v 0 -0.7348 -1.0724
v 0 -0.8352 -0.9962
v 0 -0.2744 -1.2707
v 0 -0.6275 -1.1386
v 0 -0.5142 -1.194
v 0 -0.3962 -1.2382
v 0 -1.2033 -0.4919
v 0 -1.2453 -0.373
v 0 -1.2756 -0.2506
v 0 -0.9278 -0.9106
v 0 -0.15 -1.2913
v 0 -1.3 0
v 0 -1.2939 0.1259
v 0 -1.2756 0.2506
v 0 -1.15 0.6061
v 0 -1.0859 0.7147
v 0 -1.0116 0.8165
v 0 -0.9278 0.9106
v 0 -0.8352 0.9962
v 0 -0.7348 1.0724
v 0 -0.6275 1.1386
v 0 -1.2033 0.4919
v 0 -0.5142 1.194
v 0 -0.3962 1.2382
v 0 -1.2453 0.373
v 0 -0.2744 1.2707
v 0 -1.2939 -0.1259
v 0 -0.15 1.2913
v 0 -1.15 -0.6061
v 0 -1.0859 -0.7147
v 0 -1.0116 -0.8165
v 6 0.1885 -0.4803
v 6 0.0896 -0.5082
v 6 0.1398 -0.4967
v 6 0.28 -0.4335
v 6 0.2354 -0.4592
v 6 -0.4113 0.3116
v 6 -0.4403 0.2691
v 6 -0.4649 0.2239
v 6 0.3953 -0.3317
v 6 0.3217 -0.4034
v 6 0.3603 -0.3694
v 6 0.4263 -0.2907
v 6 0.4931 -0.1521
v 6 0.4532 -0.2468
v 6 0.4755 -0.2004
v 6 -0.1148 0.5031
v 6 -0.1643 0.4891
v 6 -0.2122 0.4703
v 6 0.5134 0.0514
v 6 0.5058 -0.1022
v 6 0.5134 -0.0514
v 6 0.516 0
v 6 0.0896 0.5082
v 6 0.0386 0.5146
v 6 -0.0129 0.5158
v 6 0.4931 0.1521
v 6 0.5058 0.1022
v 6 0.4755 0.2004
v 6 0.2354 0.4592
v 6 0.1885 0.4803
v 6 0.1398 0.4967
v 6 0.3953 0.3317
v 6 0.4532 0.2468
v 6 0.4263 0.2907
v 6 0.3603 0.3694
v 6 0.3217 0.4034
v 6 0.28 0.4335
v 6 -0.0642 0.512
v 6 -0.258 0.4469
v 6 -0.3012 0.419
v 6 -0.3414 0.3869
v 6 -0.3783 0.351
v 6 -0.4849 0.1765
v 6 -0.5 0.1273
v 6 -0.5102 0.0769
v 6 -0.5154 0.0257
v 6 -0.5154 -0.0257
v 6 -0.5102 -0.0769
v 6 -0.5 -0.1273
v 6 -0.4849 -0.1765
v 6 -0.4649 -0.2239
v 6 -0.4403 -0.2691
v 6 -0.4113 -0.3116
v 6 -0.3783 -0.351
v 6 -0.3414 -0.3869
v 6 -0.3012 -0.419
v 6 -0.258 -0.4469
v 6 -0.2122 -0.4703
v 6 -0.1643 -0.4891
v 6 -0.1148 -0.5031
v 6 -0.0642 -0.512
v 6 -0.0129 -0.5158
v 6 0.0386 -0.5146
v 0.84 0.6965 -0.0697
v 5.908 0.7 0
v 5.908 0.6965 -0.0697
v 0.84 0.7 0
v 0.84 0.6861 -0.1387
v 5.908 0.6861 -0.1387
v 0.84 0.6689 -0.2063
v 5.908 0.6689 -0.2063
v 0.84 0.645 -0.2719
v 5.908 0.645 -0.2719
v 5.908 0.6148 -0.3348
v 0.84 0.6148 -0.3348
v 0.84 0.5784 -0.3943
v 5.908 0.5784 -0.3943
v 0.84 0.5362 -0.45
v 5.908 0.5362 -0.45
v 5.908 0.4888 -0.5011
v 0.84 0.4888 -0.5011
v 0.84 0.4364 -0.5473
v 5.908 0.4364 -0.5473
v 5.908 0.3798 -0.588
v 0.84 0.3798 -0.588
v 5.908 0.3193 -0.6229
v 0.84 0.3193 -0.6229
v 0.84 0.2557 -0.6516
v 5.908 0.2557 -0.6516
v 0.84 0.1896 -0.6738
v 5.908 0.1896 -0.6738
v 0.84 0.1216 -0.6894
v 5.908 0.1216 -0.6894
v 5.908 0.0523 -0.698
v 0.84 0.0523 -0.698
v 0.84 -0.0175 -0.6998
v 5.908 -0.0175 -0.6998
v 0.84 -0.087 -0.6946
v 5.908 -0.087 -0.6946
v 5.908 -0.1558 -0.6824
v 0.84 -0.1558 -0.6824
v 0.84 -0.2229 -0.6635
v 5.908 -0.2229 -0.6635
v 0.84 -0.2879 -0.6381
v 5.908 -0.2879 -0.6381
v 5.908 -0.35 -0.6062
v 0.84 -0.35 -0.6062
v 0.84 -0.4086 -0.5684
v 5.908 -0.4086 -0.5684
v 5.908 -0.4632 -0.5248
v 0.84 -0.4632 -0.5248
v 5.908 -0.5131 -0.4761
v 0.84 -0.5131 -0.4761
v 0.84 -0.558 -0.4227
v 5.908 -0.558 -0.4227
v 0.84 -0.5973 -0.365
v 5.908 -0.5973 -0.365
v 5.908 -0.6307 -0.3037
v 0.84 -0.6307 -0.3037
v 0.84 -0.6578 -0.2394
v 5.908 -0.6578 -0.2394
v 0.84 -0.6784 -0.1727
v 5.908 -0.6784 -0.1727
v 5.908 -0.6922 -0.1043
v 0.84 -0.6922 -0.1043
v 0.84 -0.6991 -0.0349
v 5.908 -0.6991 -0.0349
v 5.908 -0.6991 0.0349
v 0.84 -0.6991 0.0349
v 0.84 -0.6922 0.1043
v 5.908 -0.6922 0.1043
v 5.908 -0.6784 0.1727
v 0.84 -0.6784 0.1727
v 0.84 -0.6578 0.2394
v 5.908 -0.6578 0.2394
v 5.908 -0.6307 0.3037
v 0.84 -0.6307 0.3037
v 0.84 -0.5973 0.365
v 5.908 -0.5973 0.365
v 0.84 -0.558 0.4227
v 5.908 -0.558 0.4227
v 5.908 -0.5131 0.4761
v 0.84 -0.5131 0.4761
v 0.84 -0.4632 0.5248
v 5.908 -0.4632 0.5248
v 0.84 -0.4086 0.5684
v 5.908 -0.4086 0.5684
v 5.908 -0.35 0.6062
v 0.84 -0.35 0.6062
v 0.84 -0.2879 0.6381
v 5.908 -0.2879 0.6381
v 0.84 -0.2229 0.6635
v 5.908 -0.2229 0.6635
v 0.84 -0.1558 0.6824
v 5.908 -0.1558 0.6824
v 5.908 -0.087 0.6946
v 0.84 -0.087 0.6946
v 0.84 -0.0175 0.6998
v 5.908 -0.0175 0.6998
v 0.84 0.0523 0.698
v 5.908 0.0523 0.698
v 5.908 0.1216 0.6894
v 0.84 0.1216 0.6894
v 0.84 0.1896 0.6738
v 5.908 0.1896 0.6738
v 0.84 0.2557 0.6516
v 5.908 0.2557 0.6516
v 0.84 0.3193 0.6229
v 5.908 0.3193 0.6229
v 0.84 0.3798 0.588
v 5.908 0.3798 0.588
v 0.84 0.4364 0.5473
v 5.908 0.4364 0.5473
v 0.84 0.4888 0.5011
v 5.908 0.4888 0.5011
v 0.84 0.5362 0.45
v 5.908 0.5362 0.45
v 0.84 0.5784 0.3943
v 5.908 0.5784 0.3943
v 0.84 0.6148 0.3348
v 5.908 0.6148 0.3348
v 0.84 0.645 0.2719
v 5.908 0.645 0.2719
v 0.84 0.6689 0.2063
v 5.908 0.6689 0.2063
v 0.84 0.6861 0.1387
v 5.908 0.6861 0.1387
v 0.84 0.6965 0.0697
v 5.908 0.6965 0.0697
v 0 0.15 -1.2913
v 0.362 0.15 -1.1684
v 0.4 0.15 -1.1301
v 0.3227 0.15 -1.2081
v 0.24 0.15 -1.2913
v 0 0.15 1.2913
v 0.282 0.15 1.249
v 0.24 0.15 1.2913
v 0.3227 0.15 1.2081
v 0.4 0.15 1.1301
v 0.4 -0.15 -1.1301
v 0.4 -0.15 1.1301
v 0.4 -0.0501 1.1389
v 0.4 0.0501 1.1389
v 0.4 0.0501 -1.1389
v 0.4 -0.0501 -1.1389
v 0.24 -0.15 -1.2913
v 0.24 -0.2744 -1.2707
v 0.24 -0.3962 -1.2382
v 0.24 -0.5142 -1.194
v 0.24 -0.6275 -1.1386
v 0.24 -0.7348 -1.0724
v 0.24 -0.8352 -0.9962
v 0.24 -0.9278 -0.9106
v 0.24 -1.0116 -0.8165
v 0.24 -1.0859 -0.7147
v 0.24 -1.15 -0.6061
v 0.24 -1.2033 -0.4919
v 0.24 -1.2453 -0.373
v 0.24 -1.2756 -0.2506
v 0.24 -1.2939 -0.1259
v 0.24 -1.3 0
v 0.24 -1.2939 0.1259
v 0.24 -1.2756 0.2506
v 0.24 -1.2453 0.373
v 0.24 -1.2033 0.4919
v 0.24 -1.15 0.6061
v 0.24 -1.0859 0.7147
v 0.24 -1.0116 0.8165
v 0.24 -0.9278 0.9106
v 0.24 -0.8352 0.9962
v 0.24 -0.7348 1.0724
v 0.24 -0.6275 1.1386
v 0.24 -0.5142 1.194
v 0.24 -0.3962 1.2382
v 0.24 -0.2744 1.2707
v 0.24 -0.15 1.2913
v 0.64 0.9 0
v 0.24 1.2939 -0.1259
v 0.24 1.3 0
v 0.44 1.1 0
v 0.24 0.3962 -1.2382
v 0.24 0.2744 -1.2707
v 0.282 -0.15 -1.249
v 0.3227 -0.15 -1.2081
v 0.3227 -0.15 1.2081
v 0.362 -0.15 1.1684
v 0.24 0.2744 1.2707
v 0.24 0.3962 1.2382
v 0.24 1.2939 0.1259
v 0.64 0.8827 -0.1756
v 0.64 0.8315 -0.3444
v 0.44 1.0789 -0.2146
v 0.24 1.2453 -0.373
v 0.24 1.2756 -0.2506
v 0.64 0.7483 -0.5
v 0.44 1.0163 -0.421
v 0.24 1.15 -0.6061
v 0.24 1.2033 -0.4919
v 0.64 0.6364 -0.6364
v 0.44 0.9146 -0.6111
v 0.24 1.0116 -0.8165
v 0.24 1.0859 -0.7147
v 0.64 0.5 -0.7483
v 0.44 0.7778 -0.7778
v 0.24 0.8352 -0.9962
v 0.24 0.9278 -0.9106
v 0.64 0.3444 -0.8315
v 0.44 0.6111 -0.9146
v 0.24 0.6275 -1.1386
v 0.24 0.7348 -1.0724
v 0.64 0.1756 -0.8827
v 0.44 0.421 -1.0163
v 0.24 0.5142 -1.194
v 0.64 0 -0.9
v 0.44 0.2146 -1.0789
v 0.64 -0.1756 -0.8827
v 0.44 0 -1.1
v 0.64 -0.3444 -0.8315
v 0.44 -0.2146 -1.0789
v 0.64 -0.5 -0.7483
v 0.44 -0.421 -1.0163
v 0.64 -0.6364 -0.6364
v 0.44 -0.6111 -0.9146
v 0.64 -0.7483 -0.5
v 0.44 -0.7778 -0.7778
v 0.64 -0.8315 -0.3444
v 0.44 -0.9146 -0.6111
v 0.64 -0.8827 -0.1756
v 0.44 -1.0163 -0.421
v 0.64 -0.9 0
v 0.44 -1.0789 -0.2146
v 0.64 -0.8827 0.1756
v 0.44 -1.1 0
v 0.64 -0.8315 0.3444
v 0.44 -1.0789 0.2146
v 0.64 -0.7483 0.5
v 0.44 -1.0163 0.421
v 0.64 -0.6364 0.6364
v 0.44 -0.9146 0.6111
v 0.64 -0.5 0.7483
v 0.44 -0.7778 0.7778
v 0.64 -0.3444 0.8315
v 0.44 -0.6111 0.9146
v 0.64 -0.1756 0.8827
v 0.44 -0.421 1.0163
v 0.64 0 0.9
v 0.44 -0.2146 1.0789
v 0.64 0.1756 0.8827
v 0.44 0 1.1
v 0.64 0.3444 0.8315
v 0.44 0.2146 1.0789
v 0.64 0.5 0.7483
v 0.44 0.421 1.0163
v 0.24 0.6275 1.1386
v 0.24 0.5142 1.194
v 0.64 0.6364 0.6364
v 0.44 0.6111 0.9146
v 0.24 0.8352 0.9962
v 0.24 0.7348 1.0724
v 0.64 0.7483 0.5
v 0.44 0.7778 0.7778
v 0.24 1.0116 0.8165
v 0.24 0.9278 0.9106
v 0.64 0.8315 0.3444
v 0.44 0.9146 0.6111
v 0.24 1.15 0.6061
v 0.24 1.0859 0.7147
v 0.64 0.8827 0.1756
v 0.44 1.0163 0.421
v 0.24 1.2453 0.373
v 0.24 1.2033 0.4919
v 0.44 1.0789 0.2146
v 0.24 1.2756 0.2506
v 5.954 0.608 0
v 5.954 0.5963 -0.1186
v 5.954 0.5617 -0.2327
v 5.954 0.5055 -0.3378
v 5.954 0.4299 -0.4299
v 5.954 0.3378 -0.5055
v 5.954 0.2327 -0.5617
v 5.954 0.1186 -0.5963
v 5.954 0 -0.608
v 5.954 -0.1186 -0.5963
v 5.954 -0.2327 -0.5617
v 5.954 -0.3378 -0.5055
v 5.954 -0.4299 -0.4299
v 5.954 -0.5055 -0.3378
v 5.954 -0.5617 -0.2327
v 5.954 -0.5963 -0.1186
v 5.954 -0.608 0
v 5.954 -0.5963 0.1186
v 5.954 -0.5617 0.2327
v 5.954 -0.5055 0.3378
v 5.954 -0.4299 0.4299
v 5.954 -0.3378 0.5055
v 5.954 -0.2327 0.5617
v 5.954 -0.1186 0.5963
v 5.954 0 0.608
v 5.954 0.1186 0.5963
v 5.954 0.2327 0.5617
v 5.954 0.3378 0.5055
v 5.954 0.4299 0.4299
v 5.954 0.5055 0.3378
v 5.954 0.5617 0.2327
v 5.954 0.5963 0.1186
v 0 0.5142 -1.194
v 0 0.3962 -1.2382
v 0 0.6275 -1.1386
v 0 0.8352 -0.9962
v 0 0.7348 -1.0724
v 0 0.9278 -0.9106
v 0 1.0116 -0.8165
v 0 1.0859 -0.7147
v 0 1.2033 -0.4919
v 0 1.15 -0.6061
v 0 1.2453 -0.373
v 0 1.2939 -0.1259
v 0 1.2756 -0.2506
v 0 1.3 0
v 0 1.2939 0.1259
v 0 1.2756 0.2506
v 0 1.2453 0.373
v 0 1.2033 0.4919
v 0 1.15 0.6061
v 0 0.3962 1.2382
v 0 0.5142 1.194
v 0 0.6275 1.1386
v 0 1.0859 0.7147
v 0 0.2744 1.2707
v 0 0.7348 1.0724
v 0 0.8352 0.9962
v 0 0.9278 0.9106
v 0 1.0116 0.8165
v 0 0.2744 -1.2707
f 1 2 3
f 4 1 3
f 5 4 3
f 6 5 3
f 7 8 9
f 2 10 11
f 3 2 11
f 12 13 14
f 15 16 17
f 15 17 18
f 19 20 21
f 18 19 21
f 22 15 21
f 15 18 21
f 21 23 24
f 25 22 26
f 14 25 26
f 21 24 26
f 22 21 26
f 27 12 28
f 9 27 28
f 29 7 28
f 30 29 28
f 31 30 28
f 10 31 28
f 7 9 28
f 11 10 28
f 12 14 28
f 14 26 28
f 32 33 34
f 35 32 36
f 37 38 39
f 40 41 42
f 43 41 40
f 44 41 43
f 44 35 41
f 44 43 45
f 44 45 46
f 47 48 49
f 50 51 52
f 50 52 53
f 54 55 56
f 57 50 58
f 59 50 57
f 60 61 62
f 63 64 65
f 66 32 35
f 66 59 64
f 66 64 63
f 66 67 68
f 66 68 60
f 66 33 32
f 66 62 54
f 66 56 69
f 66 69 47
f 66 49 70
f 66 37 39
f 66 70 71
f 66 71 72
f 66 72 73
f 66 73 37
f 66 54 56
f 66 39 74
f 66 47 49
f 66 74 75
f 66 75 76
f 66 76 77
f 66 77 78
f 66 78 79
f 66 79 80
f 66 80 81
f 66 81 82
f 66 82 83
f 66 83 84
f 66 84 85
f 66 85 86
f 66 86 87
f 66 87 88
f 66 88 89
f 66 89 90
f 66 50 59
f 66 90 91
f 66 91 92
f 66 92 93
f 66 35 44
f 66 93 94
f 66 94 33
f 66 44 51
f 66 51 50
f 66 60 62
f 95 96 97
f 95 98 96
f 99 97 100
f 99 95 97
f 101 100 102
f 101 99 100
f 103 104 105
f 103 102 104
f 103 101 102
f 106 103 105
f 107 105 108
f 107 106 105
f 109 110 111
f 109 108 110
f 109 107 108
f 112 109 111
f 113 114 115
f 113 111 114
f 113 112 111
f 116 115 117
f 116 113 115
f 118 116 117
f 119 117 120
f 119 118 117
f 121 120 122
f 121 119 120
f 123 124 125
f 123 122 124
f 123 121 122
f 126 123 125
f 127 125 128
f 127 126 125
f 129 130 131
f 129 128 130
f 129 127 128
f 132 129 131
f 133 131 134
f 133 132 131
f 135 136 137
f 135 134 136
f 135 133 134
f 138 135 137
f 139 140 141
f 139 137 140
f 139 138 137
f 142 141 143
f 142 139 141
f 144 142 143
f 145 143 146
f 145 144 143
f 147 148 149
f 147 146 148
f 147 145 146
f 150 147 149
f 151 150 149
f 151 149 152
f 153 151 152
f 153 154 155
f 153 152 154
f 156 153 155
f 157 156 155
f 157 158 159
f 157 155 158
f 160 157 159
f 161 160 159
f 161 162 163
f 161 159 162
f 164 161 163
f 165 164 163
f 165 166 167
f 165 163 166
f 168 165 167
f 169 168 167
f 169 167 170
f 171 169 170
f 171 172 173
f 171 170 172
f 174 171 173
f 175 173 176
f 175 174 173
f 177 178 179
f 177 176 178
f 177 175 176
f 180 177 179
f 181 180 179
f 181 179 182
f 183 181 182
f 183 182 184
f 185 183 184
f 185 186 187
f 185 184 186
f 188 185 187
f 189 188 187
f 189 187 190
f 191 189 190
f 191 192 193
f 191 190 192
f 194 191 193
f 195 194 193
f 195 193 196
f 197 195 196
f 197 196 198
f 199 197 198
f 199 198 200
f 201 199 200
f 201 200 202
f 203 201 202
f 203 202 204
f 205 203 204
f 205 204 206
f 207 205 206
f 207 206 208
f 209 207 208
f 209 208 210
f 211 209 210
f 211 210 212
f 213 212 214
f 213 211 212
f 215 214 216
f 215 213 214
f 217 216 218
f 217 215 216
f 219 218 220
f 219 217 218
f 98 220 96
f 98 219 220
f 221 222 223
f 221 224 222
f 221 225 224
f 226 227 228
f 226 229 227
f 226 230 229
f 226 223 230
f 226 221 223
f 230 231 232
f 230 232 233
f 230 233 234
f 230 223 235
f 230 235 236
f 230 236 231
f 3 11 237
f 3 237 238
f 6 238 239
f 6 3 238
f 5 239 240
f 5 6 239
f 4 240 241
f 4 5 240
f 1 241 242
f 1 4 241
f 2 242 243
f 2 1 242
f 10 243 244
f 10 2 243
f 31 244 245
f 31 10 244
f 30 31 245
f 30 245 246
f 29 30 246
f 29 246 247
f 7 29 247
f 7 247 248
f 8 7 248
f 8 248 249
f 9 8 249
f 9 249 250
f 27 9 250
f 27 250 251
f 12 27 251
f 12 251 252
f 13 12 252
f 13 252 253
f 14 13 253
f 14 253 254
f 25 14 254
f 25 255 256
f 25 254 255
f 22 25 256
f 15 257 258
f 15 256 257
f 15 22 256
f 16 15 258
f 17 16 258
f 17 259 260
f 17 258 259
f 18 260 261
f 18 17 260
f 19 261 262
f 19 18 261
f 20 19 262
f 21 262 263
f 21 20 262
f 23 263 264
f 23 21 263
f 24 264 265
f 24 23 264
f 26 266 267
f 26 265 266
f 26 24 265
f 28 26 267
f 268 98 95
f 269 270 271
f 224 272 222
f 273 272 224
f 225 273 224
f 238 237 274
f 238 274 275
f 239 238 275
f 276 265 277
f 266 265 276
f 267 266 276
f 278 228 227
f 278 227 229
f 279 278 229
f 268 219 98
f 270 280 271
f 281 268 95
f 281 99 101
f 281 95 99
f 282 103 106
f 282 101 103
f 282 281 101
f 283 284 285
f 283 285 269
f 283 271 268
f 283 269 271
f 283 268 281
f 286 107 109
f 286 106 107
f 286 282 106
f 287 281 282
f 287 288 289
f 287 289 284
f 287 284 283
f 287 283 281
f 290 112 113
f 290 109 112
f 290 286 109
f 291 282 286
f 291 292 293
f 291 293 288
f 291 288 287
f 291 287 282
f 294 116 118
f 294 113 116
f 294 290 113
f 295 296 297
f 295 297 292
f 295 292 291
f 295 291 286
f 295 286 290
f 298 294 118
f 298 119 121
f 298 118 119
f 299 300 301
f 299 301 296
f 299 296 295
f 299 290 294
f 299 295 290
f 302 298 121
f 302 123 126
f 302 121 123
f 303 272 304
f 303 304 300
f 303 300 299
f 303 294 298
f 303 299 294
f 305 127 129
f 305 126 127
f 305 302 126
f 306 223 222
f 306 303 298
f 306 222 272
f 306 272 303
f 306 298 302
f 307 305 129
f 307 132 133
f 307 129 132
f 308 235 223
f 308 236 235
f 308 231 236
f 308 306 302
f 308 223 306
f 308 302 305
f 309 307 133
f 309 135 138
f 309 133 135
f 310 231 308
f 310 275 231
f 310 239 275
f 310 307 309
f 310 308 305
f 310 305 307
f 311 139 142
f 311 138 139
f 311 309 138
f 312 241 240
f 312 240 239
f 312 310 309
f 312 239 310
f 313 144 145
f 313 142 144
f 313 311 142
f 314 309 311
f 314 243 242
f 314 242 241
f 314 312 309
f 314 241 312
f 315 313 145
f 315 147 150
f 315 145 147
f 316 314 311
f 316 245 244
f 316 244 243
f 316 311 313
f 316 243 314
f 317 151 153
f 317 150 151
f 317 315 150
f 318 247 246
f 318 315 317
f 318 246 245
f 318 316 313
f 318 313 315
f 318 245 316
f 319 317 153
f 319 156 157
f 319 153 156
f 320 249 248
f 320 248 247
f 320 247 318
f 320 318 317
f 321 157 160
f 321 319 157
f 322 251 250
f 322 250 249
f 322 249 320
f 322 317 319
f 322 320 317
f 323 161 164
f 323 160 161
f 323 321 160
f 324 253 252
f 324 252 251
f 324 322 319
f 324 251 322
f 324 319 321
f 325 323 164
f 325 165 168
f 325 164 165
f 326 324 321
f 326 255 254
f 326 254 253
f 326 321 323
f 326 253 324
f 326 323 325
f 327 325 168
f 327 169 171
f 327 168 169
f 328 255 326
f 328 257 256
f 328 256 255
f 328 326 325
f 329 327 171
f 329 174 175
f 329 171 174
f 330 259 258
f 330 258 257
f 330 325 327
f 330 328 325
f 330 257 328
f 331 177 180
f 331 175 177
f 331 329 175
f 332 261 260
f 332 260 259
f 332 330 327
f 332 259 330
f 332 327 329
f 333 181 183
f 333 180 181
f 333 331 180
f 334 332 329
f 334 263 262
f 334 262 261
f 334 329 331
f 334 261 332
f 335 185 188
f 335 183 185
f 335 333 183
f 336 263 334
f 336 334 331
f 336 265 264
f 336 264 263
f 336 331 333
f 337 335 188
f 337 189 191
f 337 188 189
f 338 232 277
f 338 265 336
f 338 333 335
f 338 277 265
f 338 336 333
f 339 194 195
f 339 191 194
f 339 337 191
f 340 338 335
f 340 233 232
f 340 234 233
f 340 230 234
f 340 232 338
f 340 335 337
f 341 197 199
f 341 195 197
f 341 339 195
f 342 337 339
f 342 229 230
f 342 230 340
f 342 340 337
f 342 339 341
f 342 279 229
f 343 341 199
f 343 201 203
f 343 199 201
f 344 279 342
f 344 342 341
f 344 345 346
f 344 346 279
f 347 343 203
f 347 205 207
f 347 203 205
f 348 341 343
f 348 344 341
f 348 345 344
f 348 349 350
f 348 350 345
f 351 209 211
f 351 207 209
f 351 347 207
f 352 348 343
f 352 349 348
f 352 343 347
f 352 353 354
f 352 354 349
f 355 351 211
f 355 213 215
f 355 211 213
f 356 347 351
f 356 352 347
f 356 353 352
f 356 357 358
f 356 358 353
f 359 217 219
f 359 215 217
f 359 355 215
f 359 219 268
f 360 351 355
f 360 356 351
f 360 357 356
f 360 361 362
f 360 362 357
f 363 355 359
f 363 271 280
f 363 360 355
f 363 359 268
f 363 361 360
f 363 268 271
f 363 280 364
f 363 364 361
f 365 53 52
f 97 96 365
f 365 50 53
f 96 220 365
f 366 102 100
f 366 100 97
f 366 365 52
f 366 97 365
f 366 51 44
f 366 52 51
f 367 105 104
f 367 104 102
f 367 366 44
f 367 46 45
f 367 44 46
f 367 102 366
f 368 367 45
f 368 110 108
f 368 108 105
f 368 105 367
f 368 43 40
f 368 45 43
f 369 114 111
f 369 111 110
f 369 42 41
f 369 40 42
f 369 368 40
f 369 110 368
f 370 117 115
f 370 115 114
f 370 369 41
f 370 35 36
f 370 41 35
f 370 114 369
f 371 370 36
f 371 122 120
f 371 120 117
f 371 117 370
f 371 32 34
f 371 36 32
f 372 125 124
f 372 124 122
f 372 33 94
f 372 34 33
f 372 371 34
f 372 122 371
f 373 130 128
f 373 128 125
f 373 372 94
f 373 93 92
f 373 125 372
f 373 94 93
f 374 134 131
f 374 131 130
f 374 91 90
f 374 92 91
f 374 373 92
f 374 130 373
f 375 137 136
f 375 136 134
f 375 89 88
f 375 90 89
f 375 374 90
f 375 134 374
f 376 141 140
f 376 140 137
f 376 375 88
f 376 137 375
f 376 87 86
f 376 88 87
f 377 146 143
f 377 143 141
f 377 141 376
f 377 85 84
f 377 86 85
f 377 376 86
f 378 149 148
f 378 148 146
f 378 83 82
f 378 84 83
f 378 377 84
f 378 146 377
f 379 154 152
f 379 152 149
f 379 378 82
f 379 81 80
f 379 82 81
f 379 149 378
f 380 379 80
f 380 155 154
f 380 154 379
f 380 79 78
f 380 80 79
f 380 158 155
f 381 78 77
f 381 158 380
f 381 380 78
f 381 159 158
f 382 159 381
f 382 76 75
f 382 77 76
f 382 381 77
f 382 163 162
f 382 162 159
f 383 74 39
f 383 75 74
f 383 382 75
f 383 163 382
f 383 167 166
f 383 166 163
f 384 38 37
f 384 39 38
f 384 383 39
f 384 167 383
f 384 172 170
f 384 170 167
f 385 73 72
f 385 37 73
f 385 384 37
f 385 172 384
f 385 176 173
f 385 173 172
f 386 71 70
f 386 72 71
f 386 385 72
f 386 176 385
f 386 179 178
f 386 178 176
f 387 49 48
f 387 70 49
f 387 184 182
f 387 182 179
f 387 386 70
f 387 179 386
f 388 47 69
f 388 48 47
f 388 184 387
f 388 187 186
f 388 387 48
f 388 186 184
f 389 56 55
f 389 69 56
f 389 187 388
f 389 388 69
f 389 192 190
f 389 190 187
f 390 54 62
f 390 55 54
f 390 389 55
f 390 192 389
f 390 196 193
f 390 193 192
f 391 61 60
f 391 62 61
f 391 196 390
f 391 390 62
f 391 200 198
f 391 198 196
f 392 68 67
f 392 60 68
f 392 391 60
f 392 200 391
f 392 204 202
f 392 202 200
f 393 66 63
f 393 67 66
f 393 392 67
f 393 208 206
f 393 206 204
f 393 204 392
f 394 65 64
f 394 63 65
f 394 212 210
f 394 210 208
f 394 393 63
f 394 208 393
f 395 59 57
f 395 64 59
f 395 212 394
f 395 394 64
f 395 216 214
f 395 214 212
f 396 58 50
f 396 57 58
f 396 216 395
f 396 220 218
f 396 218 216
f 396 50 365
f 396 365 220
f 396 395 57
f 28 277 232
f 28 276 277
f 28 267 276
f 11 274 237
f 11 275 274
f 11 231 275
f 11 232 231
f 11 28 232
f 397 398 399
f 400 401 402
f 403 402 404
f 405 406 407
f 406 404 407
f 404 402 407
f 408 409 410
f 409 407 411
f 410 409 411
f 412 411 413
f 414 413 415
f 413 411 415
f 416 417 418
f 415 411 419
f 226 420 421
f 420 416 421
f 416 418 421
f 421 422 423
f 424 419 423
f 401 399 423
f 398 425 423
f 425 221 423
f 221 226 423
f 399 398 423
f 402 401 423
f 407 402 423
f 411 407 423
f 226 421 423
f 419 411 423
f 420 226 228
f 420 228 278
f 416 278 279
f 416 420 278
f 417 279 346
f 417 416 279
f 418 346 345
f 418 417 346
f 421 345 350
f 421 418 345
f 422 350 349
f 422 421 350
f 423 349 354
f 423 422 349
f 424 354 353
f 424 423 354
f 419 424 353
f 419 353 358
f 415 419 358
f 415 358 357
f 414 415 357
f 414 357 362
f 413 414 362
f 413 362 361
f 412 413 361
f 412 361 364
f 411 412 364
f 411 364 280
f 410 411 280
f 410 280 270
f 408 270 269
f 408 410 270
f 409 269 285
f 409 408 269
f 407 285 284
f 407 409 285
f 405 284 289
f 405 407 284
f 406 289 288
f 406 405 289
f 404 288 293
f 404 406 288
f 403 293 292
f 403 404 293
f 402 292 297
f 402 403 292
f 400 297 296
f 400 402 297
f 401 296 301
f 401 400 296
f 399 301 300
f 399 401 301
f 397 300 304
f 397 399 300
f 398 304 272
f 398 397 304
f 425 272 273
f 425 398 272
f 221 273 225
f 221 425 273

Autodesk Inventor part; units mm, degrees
ref_plane "YZ Plane" through (0, 0, 0) normal (1, 0, 0) x (0, 1, 0)
ref_plane "XZ Plane" through (0, 0, 0) normal (0, 1, 0) x (-1, 0, 0)
sketch "Skizze1" plane through (0, 0, 0) normal (0, 0, 1) x (1, 0, 0)
  line L0 (0, 0) -> (6, 0)
  line L1 (6, 0) -> (6, 0.7)
  line L2 (6, 0.7) -> (1.44, 0.7)
  line L3 (1.44, 0.7) -> (1.256, 0.7)
  line L4 (1.256, 0.7) -> (0.84, 0.7)
  line L5 (0.84, 0.7) -> (0.24, 1.3)
  line L6 (0.24, 1.3) -> (0, 1.3)
  line L7 (0, 1.3) -> (0, 0)
  line L8 (1.44, 0.7) -> (0.84, 0.7) construction
  line L9 (-1.2, 0) -> (7.2, 0) projected
  line L10 (0, 1.56) -> (0, -0.26) projected
  dimension "d0" = 6
  dimension "d1" = 45
  dimension "d2" = 0.184
  dimension "d3" = 4.56
  dimension "d4" = 0.84
  dimension "d5" = 1.4
  dimension "d6" = 1.4
  dimension "d7" = 2.6
revolve "Körper" add sketch "Skizze1" angle 360 about axis through (0, 0, 0) along (1, 0, 0)
sketch "Skizze2" plane through (0, 0, 0) normal (-1, 0, 0) x (0, 0, 1)
  line L0 (1.3, -0.15) -> (-1.3, -0.15)
  line L1 (-1.3, -0.15) -> (-1.3, 0.15)
  line L2 (-1.3, 0.15) -> (1.3, 0.15)
  line L3 (1.3, 0.15) -> (1.3, -0.15)
  line L4 (0, 0.15) -> (0, -0.15) construction
  line L5 (-1.3, 0) -> (1.3, 0) construction
  line L6 (0, 1.3) -> (0, 0) projected
  dimension "d15" = 0.3
  dimension "d16" = 2.6
extrude "Loch" cut sketch "Skizze2" against normal blind 0.4
thread "Gewinde" size "M1.4x0.3" class "6g" standard "ISO Metric profile" length 4.56
chamfer "Fase1" distance 0.184 distance2 0.092 1 edges at (6, -0.7, 0) measured on face at (6, -0.1645, 0.4552)
ref_plane "Work Plane1" through (33.575, 0, 0) normal (0, 0, -1) x (1, 0, 0)
equation "\"d0\" = NLG"
equation "\"d1\" = 0.5 * SEWI"
equation "\"d2\" = GAL"
equation "\"d3\" = GEL"
equation "\"d4\" = KOH"
equation "\"d5\" = BDM"
equation "\"d6\" = GD"
equation "\"d7\" = KOD"
equation "\"d15\" = SBR"
equation "\"d16\" = KOD"
equation "\"d8\" = STI"
equation "\"d10\" = GEL"
equation "\"d12\" = -0.5 * SPD + 0.5 * GD"
equation "\"d13\" = 0.5 * GAL"
equation "\"NLG\" = 6"
equation "\"GAL\" = 0.61345 * PTC"
equation "\"GEL\" = 4.56"
equation "\"KOH\" = 0.84"
equation "\"KOD\" = 2.6"
equation "\"SEWI\" = 90deg"
equation "\"BDM\" = NND"
equation "\"GD\" = NND"
equation "\"SBR\" = 0.3"
equation "\"STI\" = 0.4"
equation "\"SPD\" = NND - 1.2269 * PTC"
equation "\"GUL\" = 0.61345 * PTC"
equation "\"PTC\" = 0.3"
equation "\"EPV\" = 1.54"
equation "\"THREADDIA\" = 1.4"
equation "\"TOA\" = 30deg"
equation "\"NND\" = 1.4"
equation "\"GD1\" = THREADDIA - 1.2269 * PTC"
properties part number "DIN 963 - M1,4 x 6" material "Stahl, weich"
